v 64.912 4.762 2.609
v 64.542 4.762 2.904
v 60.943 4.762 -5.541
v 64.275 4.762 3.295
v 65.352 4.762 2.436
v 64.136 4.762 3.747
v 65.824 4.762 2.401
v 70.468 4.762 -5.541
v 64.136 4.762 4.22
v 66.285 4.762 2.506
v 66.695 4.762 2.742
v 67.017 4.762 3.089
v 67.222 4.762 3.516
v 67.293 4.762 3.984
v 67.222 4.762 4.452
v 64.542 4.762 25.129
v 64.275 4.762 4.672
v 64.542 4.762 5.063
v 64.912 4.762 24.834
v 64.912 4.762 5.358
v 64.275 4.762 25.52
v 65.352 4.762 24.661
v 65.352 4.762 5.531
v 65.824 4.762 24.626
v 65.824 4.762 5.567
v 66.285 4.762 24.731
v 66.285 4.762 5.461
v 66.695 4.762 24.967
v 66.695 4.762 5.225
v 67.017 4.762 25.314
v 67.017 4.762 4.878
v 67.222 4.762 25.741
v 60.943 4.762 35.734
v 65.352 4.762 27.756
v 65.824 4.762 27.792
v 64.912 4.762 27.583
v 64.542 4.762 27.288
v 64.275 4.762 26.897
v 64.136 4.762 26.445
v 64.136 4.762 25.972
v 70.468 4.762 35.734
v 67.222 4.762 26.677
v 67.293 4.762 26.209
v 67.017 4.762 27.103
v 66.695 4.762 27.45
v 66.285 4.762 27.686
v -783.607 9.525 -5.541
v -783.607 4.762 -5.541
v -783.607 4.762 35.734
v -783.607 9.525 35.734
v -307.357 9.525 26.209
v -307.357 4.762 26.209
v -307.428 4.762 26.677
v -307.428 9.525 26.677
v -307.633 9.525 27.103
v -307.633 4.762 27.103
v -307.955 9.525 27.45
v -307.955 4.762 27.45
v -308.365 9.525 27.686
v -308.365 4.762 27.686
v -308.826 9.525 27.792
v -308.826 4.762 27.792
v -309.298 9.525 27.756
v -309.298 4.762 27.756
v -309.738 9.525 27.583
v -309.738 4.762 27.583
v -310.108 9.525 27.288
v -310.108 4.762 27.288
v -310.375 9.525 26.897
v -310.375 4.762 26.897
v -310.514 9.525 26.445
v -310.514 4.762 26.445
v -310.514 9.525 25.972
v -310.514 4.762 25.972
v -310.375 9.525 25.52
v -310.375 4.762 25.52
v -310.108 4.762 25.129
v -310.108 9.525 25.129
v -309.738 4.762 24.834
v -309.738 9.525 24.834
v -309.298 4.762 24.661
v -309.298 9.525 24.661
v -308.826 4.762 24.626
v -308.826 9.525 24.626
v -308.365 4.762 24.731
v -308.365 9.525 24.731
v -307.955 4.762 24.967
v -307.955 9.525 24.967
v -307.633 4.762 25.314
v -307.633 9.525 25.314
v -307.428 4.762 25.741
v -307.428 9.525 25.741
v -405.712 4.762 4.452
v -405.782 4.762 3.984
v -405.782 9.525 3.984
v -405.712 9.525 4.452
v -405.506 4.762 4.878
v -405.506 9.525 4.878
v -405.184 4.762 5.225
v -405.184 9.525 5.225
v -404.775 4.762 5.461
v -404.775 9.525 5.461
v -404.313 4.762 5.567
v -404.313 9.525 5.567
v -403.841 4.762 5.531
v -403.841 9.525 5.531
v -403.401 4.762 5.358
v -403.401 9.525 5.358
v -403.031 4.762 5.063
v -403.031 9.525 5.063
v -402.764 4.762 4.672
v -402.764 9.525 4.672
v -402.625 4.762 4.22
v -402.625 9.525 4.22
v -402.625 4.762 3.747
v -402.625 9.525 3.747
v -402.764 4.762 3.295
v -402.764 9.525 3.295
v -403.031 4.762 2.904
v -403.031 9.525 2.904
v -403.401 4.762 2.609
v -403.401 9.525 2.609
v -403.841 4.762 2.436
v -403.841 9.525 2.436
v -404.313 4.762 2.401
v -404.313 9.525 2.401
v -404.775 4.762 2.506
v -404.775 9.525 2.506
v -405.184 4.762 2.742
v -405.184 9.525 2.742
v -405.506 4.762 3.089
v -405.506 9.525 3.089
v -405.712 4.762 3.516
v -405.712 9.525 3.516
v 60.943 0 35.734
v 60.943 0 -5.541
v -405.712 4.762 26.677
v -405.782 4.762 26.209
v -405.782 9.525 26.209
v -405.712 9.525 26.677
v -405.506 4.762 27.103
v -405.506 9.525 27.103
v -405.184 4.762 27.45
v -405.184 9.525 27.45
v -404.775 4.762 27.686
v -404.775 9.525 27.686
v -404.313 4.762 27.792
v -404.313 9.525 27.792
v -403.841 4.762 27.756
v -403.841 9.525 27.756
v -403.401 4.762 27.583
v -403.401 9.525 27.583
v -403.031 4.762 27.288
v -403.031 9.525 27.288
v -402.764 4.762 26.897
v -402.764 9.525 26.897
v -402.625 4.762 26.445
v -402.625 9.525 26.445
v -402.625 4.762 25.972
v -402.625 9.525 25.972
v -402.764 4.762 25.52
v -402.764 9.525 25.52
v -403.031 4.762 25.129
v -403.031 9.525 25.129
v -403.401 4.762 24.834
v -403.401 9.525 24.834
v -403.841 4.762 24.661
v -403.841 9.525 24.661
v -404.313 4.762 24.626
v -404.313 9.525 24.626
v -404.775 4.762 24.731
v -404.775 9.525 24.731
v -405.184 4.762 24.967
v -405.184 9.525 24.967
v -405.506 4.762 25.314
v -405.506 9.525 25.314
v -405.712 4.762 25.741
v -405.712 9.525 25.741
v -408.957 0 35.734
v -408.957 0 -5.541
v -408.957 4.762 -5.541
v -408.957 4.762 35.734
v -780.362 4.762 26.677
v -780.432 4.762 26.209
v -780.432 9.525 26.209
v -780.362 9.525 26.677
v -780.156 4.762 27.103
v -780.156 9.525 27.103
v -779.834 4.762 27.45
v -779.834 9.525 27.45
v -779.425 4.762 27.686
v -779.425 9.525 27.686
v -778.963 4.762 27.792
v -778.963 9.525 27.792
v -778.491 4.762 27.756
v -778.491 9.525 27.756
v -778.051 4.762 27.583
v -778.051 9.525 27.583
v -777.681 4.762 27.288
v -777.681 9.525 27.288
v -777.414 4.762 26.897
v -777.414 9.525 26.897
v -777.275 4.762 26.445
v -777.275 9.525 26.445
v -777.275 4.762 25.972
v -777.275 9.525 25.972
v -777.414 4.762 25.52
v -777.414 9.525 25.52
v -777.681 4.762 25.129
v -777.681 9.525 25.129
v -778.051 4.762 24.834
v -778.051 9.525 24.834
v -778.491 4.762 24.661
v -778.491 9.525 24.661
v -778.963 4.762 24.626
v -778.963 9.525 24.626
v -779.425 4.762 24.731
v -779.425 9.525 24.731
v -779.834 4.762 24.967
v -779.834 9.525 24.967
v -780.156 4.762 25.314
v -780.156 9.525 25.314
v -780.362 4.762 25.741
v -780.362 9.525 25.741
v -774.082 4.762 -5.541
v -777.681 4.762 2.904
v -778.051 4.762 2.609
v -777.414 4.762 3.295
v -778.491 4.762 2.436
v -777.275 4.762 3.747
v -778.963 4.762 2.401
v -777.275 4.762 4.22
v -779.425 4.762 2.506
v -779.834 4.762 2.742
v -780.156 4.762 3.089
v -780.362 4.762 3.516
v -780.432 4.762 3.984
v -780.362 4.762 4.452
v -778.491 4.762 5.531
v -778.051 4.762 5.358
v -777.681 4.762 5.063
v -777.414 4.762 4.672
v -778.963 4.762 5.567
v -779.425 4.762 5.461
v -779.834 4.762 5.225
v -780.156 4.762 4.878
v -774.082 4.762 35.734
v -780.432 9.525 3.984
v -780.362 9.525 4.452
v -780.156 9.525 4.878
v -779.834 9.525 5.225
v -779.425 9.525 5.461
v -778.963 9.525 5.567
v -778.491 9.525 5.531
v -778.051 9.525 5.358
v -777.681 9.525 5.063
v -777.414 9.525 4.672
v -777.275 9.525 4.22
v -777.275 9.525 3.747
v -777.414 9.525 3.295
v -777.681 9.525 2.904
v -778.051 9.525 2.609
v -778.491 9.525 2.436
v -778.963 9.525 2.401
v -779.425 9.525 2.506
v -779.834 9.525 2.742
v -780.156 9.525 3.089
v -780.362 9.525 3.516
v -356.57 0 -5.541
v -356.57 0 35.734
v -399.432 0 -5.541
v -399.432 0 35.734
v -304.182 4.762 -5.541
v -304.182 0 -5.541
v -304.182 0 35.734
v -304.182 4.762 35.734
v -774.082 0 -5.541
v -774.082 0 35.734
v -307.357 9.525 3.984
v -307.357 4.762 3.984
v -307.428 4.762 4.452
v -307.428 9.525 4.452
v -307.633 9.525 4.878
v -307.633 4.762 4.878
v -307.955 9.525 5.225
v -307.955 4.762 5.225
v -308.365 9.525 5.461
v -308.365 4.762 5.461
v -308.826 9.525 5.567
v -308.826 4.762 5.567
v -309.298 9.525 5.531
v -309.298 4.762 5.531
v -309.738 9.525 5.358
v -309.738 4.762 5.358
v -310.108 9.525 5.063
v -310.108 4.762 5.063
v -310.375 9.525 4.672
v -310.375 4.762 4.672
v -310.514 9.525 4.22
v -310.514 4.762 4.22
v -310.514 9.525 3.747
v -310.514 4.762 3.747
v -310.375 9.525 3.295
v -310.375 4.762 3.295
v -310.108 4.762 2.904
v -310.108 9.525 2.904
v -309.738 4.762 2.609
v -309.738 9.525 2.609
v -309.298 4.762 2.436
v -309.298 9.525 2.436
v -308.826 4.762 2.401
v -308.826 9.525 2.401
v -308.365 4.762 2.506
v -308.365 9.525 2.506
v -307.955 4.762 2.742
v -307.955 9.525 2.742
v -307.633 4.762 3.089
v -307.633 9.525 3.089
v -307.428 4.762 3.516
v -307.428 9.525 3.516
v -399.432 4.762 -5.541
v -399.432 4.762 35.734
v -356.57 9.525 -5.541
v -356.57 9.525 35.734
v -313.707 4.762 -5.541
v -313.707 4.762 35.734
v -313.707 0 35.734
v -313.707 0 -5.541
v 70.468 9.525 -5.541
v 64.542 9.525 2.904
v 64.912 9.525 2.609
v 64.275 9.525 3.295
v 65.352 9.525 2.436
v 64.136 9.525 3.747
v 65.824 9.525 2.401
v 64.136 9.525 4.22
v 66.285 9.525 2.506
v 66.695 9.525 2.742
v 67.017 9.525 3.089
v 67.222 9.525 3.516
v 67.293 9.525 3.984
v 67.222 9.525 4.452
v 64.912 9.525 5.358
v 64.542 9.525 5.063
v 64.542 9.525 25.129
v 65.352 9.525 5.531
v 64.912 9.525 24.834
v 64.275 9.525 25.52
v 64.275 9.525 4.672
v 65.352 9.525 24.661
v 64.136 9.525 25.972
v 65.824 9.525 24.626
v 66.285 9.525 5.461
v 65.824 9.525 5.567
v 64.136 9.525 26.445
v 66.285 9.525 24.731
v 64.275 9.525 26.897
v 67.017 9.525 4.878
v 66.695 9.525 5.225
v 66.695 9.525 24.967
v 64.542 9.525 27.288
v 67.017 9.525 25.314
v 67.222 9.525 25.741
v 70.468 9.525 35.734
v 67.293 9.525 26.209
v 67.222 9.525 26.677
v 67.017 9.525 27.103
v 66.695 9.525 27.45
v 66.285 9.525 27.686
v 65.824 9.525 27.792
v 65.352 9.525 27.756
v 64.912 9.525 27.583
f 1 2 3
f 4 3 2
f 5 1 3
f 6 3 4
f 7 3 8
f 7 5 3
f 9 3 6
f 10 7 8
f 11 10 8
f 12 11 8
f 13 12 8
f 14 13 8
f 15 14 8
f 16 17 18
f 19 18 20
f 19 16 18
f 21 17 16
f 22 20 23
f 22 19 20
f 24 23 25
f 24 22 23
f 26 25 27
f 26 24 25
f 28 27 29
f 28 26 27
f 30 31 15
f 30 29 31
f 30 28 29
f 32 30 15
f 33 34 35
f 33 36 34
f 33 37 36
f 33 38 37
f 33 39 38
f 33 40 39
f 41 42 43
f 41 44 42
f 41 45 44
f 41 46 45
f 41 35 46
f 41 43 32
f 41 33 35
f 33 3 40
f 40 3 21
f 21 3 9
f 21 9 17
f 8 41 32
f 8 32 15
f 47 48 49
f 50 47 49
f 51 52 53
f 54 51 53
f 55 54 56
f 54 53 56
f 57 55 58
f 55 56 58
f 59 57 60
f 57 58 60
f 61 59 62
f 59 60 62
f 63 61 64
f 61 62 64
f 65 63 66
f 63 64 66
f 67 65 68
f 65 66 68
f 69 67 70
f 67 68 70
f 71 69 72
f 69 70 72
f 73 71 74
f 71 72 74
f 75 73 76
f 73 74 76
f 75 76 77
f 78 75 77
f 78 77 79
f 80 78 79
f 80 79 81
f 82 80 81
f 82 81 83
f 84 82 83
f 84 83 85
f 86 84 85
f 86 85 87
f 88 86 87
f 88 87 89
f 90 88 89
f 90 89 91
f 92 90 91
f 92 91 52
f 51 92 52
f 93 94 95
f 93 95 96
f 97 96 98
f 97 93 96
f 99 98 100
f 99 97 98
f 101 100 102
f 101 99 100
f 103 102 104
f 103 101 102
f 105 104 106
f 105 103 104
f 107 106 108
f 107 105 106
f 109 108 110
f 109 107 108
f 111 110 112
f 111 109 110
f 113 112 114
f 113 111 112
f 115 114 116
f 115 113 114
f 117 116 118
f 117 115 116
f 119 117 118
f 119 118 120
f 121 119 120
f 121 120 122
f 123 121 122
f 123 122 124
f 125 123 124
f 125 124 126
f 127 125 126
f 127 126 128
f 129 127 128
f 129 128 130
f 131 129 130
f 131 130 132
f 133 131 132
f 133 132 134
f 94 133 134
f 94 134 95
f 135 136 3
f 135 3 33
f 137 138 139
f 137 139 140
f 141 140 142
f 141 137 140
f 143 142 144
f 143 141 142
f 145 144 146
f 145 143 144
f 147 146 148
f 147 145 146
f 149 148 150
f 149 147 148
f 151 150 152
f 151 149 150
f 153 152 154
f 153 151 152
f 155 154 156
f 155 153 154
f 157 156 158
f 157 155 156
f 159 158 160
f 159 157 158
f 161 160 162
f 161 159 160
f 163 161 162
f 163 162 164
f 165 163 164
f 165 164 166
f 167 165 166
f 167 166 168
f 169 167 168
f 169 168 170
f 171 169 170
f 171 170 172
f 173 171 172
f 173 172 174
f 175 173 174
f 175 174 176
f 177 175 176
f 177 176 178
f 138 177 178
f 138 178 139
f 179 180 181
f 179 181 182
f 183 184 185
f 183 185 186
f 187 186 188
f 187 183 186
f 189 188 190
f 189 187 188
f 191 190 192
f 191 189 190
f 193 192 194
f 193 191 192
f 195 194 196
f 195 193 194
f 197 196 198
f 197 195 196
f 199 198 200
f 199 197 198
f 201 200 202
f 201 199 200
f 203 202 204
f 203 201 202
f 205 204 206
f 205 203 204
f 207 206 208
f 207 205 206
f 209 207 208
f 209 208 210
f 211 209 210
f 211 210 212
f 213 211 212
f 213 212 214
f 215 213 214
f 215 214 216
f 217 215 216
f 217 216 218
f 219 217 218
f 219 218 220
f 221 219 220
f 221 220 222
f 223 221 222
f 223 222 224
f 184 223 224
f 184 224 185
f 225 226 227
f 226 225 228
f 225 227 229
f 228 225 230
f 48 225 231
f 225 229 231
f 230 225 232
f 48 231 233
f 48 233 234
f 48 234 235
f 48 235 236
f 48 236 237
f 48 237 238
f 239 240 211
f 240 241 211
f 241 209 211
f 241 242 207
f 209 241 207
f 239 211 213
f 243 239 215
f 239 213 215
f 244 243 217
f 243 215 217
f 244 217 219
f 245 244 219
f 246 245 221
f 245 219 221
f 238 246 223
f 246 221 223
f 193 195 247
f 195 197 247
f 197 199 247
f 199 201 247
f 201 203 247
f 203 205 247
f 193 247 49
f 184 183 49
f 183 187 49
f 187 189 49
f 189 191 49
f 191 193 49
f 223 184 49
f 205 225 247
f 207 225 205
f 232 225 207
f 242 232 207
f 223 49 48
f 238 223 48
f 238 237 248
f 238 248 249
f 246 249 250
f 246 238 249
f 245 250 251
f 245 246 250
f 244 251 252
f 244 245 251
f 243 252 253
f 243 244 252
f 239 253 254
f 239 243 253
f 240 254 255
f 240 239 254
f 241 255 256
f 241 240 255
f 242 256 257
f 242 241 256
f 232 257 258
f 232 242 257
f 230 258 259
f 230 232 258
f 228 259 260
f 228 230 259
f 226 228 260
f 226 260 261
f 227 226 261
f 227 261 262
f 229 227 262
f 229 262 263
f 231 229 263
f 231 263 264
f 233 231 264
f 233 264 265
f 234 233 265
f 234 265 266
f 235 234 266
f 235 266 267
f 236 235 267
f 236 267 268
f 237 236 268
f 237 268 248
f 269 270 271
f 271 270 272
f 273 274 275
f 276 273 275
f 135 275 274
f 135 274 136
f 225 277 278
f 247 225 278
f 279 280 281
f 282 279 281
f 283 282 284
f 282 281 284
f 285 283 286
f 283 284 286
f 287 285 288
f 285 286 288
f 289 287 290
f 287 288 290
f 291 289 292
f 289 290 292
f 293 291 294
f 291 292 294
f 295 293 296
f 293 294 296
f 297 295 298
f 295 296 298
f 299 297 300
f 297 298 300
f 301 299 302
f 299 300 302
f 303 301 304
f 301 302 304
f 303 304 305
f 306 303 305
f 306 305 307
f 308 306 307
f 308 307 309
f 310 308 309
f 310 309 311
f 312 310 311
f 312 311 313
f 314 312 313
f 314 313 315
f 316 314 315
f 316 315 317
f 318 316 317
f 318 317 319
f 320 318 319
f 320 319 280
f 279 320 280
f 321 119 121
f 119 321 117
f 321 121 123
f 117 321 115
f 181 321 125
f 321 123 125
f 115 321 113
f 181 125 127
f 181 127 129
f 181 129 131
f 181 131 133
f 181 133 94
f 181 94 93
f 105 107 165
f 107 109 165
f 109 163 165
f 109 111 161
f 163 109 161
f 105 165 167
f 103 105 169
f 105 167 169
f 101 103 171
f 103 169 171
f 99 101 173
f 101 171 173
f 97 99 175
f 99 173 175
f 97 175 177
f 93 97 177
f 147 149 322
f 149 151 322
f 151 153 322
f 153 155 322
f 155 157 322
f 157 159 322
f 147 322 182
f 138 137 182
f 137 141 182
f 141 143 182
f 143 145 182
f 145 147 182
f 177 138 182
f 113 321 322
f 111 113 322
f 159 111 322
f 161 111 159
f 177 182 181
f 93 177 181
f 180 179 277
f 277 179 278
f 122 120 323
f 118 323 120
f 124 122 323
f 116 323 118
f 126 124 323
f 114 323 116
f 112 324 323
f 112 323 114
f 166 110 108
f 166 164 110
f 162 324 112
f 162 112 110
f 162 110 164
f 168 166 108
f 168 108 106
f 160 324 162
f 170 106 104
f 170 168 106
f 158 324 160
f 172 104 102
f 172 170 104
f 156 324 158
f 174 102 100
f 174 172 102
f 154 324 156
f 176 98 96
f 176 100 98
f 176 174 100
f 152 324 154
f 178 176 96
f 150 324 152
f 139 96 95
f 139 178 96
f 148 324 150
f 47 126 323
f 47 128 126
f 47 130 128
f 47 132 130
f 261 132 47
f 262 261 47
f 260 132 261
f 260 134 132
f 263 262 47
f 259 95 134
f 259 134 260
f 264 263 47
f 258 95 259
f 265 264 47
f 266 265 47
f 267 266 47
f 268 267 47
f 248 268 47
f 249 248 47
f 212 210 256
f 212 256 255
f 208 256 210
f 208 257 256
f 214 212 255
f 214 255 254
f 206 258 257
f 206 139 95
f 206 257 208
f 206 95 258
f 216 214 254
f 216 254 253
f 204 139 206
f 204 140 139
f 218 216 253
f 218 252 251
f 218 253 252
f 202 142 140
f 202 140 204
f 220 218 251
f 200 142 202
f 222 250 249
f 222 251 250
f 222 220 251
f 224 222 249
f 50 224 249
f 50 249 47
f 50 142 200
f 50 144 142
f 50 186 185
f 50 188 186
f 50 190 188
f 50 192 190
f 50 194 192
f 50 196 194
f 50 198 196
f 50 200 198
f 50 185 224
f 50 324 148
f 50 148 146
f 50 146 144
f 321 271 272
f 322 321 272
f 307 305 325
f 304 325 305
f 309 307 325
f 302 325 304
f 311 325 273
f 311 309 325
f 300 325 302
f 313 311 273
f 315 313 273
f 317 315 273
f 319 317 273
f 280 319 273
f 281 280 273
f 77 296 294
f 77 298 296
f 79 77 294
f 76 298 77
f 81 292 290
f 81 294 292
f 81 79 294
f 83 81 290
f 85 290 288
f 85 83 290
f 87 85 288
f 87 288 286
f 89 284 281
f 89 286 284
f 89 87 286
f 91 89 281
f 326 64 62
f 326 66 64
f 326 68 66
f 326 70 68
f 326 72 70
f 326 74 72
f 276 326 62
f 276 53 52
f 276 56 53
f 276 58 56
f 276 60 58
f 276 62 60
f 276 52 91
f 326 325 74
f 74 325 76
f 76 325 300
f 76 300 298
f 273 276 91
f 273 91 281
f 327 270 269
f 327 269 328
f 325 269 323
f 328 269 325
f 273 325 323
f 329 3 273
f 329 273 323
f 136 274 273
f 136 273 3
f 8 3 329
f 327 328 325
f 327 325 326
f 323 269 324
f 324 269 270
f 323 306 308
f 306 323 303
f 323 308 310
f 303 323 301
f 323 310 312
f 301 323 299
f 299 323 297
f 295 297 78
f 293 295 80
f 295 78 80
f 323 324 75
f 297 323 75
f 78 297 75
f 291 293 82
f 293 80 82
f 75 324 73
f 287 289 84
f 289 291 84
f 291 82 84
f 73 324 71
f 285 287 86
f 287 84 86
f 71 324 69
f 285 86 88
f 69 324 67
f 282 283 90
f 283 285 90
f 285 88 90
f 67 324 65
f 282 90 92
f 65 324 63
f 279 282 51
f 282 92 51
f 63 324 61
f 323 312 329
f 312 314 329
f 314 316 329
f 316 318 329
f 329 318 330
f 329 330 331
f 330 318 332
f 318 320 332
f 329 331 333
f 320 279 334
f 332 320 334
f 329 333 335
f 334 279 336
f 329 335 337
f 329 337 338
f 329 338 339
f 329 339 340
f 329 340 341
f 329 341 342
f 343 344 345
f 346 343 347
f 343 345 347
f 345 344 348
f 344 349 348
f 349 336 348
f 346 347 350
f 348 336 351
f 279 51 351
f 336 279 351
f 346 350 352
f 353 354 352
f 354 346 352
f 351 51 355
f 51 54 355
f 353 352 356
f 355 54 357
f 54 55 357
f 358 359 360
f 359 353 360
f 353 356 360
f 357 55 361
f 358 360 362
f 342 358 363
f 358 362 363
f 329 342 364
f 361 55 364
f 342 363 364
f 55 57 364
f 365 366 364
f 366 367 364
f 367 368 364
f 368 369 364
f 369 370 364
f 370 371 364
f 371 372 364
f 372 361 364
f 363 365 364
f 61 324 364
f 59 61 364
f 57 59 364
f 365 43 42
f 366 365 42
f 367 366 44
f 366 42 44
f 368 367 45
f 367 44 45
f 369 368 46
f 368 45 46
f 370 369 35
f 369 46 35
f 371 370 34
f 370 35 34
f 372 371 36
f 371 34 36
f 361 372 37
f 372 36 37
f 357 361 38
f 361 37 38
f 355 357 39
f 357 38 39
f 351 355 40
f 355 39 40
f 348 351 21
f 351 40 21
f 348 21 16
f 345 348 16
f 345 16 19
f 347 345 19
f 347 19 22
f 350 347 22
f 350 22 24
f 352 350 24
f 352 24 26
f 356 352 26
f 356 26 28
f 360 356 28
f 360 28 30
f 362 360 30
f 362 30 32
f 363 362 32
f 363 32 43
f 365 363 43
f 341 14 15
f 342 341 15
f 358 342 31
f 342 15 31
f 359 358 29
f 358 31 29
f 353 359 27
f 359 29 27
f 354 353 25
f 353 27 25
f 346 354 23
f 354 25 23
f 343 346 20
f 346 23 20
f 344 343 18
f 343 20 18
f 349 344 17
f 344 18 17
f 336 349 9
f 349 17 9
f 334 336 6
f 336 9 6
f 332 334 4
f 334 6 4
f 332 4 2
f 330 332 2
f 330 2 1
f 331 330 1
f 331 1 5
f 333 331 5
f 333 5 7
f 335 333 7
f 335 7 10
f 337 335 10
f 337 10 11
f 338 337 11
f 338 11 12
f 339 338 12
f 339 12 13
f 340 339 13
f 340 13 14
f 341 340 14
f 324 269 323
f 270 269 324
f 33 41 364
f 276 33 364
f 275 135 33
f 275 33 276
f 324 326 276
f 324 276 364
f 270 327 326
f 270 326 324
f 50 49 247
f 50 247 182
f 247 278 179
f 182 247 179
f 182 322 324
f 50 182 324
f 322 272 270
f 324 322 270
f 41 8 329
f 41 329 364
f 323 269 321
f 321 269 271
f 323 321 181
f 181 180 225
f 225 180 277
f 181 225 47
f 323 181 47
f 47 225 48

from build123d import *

# Parameters (mm, degrees)
F0_W     = 42.8625
F0_H     = 41.275
F0_W_2   = 9.525
F0_R     = 1.5875
F0_W_3   = 365.125
F1_DEPTH = 9.525
F2_DEPTH = 4.7625


with BuildPart() as f1:
    # F0 (on Front) → F1 (new body)
    with BuildSketch(Plane.XZ):
        with Locations((-335.1384558707, 15.0960850042)):
            Rectangle(F0_W, F0_H)
        with Locations((-308.9447058707, 15.0960850042)):
            Rectangle(F0_W_2, F0_H)
        with Locations((-308.9447058707, 3.9835850042)):
            Circle(F0_R, mode=Mode.SUBTRACT)
        with Locations((-308.9447058707, 26.2085850042)):
            Circle(F0_R, mode=Mode.SUBTRACT)
        with Locations((-121.6197058707, 15.0960850042)):
            Rectangle(F0_W_3, F0_H)
        with Locations((65.7052941293, 15.0960850042)):
            Rectangle(F0_W_2, F0_H)
        with Locations((65.7052941293, 3.9835850042)):
            Circle(F0_R, mode=Mode.SUBTRACT)
        with Locations((65.7052941293, 26.2085850042)):
            Circle(F0_R, mode=Mode.SUBTRACT)
    extrude(amount=-F1_DEPTH)

    # F0 (on Front) → F2 (cut)
    with BuildSketch(Plane.XZ):
        with Locations((65.7052941293, 15.0960850042)):
            Rectangle(F0_W_2, F0_H)
        with Locations((65.7052941293, 3.9835850042)):
            Circle(F0_R, mode=Mode.SUBTRACT)
        with Locations((65.7052941293, 26.2085850042)):
            Circle(F0_R, mode=Mode.SUBTRACT)
        with Locations((-308.9447058707, 15.0960850042)):
            Rectangle(F0_W_2, F0_H)
        with Locations((-308.9447058707, 3.9835850042)):
            Circle(F0_R, mode=Mode.SUBTRACT)
        with Locations((-308.9447058707, 26.2085850042)):
            Circle(F0_R, mode=Mode.SUBTRACT)
    extrude(amount=-F2_DEPTH, mode=Mode.SUBTRACT)


with BuildPart() as f3_1:
    # F3: instance of F1
    add(f1.part.mirror(Plane(origin=(-356.5697058707, 4.7625, 15.0960850042), x_dir=(0, -1, 0), z_dir=(-1, 0, 0))))


solid = Compound([f1.part, f3_1.part])
